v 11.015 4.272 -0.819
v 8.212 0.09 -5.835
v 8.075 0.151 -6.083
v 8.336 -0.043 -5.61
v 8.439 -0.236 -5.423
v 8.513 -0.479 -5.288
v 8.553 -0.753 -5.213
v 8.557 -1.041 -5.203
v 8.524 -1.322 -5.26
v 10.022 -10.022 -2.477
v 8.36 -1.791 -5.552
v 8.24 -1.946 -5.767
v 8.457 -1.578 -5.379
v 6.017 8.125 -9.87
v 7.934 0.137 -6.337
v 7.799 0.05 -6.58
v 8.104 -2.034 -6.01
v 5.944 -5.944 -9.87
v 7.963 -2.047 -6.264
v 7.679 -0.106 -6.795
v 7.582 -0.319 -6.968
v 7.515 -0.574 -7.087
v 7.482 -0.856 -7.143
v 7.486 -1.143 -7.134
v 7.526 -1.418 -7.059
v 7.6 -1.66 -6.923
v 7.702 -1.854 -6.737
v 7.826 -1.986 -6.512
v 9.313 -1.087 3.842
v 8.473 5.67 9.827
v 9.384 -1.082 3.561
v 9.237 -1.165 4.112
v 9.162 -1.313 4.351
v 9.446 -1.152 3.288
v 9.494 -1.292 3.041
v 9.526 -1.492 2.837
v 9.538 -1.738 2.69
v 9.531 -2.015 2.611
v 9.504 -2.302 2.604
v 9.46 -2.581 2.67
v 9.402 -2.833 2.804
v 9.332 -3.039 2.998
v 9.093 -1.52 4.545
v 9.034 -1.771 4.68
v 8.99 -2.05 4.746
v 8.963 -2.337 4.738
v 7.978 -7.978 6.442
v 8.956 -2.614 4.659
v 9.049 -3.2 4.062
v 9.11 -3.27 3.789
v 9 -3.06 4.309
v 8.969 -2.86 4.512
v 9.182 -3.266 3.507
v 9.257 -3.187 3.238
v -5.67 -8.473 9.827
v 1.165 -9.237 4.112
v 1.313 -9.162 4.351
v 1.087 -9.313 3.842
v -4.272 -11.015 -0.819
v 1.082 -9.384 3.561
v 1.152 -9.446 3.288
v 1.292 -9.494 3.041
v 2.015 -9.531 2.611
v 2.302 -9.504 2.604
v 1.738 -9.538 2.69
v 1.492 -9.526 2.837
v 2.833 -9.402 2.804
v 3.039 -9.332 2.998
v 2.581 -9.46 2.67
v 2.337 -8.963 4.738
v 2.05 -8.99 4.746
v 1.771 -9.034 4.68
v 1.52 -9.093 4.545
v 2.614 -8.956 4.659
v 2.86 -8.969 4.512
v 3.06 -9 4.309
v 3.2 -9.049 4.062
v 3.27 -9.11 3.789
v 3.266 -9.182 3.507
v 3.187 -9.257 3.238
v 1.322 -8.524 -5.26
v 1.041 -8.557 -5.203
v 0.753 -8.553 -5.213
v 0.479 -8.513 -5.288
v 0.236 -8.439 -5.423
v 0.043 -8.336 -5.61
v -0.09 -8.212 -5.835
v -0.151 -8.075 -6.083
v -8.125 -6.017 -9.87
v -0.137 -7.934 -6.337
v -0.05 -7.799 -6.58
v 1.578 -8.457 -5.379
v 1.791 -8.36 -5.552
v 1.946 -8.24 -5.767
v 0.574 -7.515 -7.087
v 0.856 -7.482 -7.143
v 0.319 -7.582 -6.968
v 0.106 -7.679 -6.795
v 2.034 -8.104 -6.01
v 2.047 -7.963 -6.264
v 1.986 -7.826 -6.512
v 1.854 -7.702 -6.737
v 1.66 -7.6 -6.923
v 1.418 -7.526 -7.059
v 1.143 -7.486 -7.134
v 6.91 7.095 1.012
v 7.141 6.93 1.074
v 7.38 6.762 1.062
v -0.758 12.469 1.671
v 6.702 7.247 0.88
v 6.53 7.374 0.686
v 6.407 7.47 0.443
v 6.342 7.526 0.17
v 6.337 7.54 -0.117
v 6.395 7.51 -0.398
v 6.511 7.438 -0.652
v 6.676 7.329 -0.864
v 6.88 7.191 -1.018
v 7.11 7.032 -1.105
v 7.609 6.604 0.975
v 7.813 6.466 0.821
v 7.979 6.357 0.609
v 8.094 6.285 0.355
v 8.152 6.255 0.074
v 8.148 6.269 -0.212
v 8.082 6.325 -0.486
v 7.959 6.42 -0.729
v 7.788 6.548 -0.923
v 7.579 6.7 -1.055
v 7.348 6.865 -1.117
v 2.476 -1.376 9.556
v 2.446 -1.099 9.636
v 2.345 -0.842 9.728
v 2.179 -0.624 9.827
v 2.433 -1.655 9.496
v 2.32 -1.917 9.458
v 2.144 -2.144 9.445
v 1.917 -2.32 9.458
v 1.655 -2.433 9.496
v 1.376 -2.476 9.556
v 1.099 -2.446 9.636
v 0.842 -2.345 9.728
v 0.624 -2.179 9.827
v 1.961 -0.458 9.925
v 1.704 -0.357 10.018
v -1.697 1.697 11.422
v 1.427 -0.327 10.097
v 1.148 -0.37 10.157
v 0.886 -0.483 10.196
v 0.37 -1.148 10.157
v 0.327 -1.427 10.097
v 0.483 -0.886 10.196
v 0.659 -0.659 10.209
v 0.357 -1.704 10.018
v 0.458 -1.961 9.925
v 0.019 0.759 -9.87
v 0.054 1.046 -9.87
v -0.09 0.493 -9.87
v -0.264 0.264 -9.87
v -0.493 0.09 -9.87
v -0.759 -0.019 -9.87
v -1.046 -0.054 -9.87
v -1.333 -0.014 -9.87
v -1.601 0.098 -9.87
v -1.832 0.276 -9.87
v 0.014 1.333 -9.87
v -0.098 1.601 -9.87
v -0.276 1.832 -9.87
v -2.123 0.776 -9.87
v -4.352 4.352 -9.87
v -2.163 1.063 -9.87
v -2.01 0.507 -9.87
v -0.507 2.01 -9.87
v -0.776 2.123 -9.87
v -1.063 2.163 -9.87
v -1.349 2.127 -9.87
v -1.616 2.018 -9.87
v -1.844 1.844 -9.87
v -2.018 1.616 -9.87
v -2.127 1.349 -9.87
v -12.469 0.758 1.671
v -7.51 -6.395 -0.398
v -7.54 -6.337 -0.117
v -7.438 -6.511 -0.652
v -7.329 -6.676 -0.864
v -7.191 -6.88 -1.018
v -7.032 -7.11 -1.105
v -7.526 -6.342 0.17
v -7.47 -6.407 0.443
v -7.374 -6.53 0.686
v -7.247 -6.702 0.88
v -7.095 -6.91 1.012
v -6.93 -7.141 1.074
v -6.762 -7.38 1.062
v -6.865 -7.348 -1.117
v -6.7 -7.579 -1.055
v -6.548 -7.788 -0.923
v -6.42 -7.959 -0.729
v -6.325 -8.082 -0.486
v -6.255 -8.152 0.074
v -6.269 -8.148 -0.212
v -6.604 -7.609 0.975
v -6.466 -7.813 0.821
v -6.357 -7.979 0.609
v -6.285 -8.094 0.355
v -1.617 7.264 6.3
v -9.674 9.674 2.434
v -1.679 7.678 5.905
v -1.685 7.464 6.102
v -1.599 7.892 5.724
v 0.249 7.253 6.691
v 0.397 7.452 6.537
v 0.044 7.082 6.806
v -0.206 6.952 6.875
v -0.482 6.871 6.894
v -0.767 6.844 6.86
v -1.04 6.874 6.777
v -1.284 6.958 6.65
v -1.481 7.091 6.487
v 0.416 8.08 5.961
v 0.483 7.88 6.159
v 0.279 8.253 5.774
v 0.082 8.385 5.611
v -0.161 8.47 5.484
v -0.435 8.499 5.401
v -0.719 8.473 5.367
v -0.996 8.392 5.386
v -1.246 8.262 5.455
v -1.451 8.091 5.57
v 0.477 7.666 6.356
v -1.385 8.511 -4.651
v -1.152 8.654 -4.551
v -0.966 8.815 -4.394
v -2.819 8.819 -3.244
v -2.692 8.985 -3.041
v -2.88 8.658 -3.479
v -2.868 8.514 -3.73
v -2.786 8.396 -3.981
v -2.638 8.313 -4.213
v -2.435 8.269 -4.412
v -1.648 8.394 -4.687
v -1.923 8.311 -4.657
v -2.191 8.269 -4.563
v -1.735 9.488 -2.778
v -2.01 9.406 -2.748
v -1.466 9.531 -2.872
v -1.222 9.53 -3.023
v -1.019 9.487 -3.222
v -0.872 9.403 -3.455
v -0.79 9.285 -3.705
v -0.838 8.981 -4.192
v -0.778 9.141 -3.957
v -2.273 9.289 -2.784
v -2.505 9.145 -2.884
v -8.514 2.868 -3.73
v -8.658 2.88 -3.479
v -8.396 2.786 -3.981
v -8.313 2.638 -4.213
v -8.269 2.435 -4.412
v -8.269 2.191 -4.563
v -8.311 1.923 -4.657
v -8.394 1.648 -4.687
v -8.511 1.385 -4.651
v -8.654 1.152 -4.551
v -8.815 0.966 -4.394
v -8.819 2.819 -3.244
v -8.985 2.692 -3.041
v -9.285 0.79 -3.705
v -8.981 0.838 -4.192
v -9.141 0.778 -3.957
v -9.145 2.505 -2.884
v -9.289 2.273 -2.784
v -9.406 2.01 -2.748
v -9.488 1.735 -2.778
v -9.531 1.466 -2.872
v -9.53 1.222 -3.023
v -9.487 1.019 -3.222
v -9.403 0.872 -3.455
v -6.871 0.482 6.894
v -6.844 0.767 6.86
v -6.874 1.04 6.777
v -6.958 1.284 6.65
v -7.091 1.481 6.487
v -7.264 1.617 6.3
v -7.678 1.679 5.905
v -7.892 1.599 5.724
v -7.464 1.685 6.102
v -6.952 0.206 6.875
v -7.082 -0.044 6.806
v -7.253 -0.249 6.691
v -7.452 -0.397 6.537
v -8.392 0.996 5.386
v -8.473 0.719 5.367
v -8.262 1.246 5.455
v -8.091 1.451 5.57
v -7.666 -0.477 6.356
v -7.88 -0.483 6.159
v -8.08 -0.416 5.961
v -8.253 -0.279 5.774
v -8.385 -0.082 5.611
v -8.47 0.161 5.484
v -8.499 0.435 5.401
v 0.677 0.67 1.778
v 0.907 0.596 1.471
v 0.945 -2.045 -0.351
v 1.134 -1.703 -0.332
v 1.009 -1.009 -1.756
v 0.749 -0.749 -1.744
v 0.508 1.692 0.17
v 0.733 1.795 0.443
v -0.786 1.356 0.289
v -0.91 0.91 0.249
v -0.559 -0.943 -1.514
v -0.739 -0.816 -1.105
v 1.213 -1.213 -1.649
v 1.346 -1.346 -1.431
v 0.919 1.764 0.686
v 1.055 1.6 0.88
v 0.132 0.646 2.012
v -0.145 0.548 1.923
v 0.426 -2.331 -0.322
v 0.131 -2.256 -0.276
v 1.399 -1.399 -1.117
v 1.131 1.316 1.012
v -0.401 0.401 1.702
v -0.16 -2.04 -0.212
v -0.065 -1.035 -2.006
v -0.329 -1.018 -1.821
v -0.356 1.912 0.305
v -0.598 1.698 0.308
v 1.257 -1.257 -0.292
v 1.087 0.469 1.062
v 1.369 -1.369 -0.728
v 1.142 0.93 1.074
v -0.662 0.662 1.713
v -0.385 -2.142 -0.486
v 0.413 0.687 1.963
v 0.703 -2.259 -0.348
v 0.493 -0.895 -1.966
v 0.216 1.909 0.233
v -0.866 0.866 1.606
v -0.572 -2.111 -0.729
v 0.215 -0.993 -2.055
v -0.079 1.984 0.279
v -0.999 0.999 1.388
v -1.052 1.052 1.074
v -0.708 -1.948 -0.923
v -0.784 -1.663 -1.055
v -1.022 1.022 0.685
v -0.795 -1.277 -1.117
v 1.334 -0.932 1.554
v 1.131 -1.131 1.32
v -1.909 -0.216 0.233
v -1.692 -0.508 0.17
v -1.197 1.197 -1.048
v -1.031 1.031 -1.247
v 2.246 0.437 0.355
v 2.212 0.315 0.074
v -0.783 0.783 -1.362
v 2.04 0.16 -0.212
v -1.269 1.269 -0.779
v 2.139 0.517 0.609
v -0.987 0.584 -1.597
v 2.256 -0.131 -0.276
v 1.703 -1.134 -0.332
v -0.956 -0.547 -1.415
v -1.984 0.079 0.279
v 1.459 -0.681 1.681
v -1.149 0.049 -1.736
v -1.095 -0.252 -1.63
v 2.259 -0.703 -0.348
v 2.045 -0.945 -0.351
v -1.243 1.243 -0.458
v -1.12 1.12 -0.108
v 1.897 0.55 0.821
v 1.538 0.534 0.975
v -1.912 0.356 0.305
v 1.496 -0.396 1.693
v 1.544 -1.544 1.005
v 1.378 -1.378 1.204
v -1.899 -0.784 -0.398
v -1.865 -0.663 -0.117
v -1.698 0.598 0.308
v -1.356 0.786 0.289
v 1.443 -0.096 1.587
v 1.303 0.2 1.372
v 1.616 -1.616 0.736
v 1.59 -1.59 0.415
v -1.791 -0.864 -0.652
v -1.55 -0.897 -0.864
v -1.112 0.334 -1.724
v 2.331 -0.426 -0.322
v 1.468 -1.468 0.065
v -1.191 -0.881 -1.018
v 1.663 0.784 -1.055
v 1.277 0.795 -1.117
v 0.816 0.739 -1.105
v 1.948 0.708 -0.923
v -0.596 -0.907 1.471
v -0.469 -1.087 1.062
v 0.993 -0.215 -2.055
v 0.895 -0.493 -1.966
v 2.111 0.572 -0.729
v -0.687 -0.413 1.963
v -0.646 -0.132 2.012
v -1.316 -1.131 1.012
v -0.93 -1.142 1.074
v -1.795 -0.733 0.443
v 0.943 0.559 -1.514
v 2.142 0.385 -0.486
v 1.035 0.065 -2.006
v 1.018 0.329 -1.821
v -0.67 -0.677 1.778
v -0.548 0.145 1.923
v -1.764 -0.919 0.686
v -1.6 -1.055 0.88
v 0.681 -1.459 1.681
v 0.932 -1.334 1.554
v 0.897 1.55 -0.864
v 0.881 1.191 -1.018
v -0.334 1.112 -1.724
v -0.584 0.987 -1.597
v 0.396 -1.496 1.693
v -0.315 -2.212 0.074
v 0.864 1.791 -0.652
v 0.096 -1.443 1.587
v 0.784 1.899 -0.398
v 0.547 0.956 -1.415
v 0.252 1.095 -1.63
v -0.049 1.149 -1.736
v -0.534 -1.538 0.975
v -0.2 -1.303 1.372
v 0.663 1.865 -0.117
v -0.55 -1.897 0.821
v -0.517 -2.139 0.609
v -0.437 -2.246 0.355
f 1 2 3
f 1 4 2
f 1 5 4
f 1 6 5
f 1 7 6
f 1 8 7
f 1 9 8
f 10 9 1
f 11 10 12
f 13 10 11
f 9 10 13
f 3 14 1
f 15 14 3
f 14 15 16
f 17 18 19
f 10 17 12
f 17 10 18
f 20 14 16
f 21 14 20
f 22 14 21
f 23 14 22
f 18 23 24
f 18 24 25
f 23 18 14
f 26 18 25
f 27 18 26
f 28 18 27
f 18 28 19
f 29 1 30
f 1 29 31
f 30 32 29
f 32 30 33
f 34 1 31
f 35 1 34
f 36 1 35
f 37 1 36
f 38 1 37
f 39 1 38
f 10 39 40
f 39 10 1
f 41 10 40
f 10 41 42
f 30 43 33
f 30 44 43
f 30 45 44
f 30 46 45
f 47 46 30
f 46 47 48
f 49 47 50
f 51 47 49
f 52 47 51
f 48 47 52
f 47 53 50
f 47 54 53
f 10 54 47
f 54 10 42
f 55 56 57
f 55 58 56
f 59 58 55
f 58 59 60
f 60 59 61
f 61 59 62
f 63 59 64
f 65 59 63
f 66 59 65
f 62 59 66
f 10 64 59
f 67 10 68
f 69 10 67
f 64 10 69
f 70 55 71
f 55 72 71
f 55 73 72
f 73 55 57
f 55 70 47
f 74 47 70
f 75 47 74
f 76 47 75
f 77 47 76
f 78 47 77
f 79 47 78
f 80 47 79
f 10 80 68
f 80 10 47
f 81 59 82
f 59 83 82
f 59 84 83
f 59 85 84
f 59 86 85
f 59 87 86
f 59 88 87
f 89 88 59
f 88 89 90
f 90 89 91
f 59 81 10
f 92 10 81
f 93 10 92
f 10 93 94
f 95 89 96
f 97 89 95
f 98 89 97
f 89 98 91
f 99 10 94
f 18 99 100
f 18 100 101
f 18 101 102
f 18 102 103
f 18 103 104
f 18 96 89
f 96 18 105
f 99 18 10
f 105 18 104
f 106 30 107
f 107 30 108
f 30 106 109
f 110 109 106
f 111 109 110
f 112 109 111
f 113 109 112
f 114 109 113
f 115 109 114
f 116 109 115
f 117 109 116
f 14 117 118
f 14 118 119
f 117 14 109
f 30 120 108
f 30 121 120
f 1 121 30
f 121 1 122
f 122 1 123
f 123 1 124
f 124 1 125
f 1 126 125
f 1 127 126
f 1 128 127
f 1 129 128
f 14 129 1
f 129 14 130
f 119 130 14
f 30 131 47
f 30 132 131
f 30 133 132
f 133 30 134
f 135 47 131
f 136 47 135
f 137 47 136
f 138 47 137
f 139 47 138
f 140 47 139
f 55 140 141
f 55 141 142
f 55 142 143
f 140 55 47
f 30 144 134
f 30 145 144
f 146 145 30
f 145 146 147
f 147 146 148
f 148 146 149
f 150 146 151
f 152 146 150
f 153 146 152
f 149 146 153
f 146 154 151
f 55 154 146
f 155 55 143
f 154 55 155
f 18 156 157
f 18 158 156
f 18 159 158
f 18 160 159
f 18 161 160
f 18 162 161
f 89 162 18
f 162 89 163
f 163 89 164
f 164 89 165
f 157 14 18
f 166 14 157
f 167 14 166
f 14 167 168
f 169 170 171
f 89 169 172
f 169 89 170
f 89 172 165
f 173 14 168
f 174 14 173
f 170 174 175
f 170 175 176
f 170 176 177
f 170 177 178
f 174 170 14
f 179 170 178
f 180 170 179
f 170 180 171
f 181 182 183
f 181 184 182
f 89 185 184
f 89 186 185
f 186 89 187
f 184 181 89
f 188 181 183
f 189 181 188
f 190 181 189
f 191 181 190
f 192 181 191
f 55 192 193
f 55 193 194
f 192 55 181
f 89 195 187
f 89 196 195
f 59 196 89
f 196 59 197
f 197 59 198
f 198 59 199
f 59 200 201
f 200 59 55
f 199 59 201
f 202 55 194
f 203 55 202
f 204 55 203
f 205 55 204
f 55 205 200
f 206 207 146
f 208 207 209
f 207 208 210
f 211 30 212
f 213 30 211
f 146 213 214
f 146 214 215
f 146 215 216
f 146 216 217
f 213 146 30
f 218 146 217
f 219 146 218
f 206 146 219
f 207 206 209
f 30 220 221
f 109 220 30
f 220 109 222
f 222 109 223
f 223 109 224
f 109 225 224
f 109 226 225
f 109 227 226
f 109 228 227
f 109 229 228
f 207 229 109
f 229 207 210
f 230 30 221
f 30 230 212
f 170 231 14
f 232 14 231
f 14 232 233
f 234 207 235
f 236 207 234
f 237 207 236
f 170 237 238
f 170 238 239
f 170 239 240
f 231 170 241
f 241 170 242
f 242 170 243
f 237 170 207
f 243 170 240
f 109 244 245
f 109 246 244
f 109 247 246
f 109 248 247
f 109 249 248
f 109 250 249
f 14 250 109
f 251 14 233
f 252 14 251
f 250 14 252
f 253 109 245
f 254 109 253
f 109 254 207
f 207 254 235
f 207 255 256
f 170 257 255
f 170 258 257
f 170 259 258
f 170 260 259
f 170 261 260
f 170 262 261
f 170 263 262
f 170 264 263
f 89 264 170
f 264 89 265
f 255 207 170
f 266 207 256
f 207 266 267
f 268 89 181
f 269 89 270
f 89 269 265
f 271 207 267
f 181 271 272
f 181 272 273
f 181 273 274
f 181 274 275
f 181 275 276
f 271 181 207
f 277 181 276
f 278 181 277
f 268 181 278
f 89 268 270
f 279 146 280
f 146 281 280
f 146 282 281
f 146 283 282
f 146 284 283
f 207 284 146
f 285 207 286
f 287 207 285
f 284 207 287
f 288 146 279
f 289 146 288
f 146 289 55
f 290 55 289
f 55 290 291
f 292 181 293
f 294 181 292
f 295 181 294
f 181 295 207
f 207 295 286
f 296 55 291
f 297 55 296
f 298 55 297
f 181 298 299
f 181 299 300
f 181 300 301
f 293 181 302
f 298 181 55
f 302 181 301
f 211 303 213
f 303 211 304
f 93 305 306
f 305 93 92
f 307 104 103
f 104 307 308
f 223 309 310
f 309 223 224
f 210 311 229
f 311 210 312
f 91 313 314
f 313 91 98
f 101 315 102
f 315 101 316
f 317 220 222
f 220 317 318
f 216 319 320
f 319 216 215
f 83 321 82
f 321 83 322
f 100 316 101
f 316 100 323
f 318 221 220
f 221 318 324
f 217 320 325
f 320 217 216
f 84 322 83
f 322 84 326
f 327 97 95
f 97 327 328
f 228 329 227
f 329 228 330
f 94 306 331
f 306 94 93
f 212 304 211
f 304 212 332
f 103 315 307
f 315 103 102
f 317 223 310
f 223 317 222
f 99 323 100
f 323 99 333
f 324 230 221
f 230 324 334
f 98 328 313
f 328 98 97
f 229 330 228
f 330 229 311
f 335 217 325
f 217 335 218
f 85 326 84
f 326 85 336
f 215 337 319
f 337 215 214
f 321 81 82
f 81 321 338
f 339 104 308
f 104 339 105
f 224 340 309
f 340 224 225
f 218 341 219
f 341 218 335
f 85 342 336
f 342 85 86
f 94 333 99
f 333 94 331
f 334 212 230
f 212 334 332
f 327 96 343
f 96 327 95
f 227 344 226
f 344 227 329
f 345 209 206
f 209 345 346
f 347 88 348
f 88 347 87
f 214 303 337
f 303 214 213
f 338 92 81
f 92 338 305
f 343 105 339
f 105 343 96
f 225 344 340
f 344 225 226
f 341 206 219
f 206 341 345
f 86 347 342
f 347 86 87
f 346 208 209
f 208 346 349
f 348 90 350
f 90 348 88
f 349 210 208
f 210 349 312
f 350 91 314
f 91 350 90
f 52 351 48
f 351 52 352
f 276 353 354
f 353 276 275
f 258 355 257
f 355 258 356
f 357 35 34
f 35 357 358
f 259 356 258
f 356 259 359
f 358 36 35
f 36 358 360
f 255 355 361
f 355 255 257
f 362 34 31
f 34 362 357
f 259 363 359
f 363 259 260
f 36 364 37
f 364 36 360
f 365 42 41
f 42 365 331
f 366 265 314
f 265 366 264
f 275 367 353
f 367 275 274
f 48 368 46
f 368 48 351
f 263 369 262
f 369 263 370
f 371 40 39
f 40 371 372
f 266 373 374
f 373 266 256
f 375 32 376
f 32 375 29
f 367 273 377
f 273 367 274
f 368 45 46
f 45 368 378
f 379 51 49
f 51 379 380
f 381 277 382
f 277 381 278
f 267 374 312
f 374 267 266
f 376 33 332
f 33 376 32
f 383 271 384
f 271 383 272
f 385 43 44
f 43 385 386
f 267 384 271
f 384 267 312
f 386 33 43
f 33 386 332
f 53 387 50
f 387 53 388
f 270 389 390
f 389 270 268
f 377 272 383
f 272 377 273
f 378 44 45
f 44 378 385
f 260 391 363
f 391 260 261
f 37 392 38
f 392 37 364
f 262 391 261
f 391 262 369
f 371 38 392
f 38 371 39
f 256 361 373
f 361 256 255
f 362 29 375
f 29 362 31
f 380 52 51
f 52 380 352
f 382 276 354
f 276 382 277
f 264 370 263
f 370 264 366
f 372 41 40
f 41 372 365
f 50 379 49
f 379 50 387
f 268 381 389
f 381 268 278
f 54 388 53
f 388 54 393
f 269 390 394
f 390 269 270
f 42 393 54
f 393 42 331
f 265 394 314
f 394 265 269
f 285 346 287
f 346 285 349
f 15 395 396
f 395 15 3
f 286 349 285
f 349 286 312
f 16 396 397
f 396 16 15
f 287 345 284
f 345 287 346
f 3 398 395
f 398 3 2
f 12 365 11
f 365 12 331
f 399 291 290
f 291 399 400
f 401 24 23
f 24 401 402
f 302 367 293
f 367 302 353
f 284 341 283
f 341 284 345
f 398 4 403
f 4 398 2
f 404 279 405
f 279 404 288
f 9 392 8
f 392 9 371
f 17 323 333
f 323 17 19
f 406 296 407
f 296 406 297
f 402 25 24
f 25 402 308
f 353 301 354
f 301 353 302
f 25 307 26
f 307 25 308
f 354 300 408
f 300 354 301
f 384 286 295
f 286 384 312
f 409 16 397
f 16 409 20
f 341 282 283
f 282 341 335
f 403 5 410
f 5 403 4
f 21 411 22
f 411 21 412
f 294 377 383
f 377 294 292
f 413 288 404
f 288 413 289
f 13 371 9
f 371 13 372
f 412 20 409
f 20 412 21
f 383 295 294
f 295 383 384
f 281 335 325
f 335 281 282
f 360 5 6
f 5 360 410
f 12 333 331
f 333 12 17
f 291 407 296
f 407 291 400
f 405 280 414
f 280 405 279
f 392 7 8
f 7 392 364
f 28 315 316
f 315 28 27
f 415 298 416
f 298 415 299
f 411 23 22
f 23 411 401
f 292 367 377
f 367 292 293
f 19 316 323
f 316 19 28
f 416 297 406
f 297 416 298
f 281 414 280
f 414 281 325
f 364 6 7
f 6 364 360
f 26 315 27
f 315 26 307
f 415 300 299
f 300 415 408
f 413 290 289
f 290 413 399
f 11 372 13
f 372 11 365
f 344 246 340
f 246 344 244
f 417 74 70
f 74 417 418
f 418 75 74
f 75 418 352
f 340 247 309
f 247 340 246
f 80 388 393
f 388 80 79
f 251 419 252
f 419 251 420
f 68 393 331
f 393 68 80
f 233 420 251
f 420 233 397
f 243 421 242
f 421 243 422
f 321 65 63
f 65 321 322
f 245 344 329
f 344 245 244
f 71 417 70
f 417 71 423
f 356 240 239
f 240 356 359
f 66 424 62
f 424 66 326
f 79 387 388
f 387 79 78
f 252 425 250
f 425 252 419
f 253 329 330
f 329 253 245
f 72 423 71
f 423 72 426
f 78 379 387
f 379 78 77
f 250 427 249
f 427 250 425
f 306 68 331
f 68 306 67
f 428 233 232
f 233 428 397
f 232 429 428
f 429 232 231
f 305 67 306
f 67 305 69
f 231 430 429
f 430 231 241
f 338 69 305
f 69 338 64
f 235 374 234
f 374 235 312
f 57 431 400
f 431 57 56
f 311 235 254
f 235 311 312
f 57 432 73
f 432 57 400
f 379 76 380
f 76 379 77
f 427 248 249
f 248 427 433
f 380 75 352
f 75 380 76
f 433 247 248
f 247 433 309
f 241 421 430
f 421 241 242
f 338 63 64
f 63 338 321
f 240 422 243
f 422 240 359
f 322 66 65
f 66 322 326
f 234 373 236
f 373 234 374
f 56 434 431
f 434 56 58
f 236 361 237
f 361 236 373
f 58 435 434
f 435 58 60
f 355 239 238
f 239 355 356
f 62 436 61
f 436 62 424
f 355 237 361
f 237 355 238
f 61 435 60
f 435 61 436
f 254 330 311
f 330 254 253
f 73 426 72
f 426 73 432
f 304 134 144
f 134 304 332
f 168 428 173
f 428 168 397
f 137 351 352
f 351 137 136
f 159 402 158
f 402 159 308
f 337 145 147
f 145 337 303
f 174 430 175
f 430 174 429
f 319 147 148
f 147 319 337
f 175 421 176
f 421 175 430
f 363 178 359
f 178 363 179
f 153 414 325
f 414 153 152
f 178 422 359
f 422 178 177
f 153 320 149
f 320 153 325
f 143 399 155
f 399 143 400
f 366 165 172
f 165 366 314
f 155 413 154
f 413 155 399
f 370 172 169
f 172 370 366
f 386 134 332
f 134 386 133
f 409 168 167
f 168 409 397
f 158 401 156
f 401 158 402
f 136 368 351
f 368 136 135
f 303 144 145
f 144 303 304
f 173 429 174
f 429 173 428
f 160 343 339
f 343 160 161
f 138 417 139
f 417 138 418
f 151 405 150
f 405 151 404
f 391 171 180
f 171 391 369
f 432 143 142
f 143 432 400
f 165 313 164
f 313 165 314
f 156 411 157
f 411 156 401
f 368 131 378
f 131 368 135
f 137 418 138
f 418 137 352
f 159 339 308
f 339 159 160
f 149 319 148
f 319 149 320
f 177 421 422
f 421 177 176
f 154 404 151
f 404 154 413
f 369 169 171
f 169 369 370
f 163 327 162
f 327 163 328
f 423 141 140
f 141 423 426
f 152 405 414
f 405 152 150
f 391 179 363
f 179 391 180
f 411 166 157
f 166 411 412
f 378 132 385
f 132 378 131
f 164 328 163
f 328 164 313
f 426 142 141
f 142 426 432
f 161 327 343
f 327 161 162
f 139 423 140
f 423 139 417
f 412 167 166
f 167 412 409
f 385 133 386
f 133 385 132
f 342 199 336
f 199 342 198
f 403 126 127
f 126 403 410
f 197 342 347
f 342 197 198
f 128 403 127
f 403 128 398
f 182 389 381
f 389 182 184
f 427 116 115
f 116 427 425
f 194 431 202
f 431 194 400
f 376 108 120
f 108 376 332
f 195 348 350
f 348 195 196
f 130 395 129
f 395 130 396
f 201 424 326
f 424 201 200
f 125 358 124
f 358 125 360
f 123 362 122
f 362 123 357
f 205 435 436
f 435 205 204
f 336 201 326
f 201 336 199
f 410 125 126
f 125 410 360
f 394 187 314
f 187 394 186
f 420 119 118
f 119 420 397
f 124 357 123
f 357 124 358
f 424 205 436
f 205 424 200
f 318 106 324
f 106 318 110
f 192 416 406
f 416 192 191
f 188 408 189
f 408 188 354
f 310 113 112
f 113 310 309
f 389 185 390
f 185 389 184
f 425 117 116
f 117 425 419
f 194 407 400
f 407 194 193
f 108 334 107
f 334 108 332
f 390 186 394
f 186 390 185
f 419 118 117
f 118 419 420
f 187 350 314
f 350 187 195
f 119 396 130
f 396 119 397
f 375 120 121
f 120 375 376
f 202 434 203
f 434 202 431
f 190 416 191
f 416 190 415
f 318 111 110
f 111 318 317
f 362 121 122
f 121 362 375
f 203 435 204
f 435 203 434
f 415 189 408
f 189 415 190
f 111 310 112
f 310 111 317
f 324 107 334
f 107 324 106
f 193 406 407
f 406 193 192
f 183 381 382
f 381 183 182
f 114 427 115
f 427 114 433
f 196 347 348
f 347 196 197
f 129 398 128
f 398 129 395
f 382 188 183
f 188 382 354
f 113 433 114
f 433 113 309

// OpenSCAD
//Шаг сетки для решётки из ромбододекаэдров (межцентровое расстояние)
MM_GRID_STEP = 20;

//диаметр отвертия (диаметр описанной окружности около многоугольника детализации)
//если диаметр = 0, то отверстий нет, 2.2 = диаметр зубочистки
MM_HOLE_DIAMETER = 2.2;

//true либо false параметр, показывающия исходный ромбододекаэдр без скоса
//для подсветки и разработки делай true, для 3Д-печати делай false
WILL_SHOW_CORE = false;

//показывать цвета
WILL_SHOW_COLOR = true;

//надо ли класть фигуру на жёлтую грань?
WILL_PUT_ON_YELLOW_FACE = true;

//длина укороченной чёрной стороны (когда 1 - ось поворта по короткой диагонали)
//ось поворота - это граница цветов 
//синее море внизу и белое небо сверху на видео от Певницкого 15 мая
CUT_RATIO = 1;
//синее море внизу и белое небо сверху, если угол положительный
CUT_DEGREE = 10;

//такой n-угольник для детализации отверстия
HOLE_DETALISATION_IS_N_POLYGON = 24;

//дальше параметры не менять, 
//сторона куба, вписанного в ромбододекаэдр, пропорциональна шагу сетки
CUBE_SIDE = MM_GRID_STEP / sqrt(2);

//тетраэдр по четырём точкам, точка номер ноль - вершина
module m_tetrahedron(p4) {
    polyhedron(points=p4, faces=[[0,1,2],[0,2,3],[0,3,1],[3,2,1]]);
}

//пирамида с четырёхугольноком в основании, точка номер ноль - вершина
module m_p5_pyramid(p5) {
    polyhedron(points=p5, faces=[[0,1,2],[0,2,3],[0,3,4],[0,4,1],[4,3,2,1]]);
}

//пирамида с треугольным или четырёхугольным основанием
module m_p4_p5(p4_or_p5) {
    if (len(p4_or_p5) == 4) {m_tetrahedron(p4_or_p5);} else {m_p5_pyramid(p4_or_p5);}
}

//интерполирование по прямой с точками р0(ноль) и р1(один) любым вещественным числом
//массивы (три координаты) тоже можно складывать и умножать на число
function f_n01(p0, p1, n01) = ((p1 - p0) * n01) + p0;

//сумма массива с любым числом точек (рекурсивно)
function f_sum_recursion(array_p, my_result, i) =
    ((i>=len(array_p)) ?
        my_result :
        f_sum_recursion(array_p, my_result + array_p[i], i+1));

//сумма векторов, array_p[0] * 0 - нужно, чтобы получить необходимое число нулей [0,0,0]
function f_sum(array_p) = f_sum_recursion(array_p, array_p[0] * 0, 0);

//центр массива точек
function f_center(array_p) = f_sum(array_p) * (1 / len(array_p));

//синтаксис для переменных (в том числе, функциональных переменных)
//my_scale - во сколько раз раздувать (масштабировать) треугольник или 4 точки
function f_three_or_four_points_extend(p3_or_p4, my_scale = 1) =
    //центр тяжести треугольника или четырёх точек
    let (c = f_center(p3_or_p4))
    //функцция раздувания трёх или четырёх точек с сохранением чентра тяжести
    let (f = function (i) f_n01(c, p3_or_p4[i], my_scale))
//раздутый треугольник или раздутые четыре точки
(len(p3_or_p4)==3) ? [f(0), f(1), f(2)] : [f(0), f(1), f(2), f(3)];

//полупространство как треугольная или четырёхугольная пирамида
//берём основание и строим пирамиду с вершиной в нуле
//раздуваем основание; если scale_pyramyd_ratio = 1, то сохраняем пропорции
//если scale_pyramyd_ratio = 2, то вытягиваем пирамиду по высоте в два раза
function f_half_space(p3_or_p4, scale_triangle = 1, scale_pyramyd_ratio = 1) = 
    //раздутое основание
    let (p3_or_p4 = f_three_or_four_points_extend(p3_or_p4, scale_triangle))
    //во сколько раз удлинять растояние от чентра основания до вершины
    let (scale_to_apex = scale_triangle * scale_pyramyd_ratio)
    //вершина пирамиды
    let (p_apex = f_n01(f_center(p3_or_p4), [0,0,0], scale_to_apex))
    //массив: вершина + треугольное основание
    let (arr_3 = [p_apex, p3_or_p4[0], p3_or_p4[1], p3_or_p4[2]])
    //массив: вершина + четырёхугольное основание
    let (arr_4 = [p_apex, p3_or_p4[0], p3_or_p4[1], p3_or_p4[2], p3_or_p4[3]])
//в зависимости от количества точек в основании пирамида труегольная или четырёхугольная
(len(p3_or_p4)==3) ? arr_3 : arr_4;

//координаты (вершин октаэдра), PX,PY,PZ-положительные, MX,MY,MZ-со знаком минус
PX = [2,0,0]; PY = [0,2,0]; PZ = [0,0,2]; MX = [-2,0,0]; MY = [0,-2,0]; MZ = [0,0,-2];
//вершины куба с одной положительной координатой
CX = [1,-1,-1]; CY = [-1,1,-1]; CZ = [-1,-1,1];
//вершины куба с двумя положительными координатами
CXY = [1,1,-1]; CYZ = [-1,1,1]; CXZ = [1,-1,1];
//две вершины куба: со всеми положительными и со всеми отрицательными координатами
CXYZ = [1,1,1]; CMMM = [-1,-1,-1];

//вершины каждой грани по часовой стрелке, если смотреть снаружи
//СУММА ПРОТИВОПОЛОЖНЫХ ГРАНЕЙ = 11
//tip - солнце (к какой вершине повёрнута верхняя часть плоскости сечения
//грани 0..3 - красные (сверху)
face_0 = [PX, CXZ, PZ, CXYZ]; tip_0 = 1;
face_1 = [PZ, CYZ, PY, CXYZ]; tip_1 = 1;
face_2 = [MX, CYZ, PZ, CZ]; tip_2 = 1;
face_3 = [PZ, CXZ, MY, CZ]; tip_3 = 1;

//грани 4..7 - жёлтые (ободок)
face_4 = [PY, CXY, PX, CXYZ]; tip_4 = 3; //четвёртая грань смотрит на нулевую и первую
face_5 = [PY, CYZ, MX, CY]; tip_5 = 3; //пятая грань отворачивается от первой и второй
face_6 = [MY, CXZ, PX, CX]; tip_7 = 3;
face_7 = [MY, CMMM, MX, CZ]; tip_6 = 3;

//грани 8..11 - зелёные (снизу)
face_8 = [MZ, CXY, PY, CY]; tip_8 = 1;
face_9 = [PX, CXY, MZ, CX]; tip_9 = 1;
face_10 = [MZ, CMMM, MY, CX]; tip_10 = 1;
face_11 = [MX, CMMM, MZ, CY]; tip_11 = 1;

//массивы кончиков стрелок, указывающих наверх (на солнце)
tip_indexes_all = [tip_0, tip_1, tip_2, tip_3, tip_4, tip_5, tip_6, tip_7, tip_8, tip_9, tip_10, tip_11];
face_all = [face_0, face_1, face_2, face_3, face_4, face_5, face_6, face_7, face_8, face_9, face_10, face_11];
//нужная точка на грани (когда точка ноль, на неё указывает срелка)
function f_face_i12_i4(i12, i4) = face_all[i12][(i4 + 4 - tip_indexes_all[i12]) % 4];
function f_face_i12(i) = [f_face_i12_i4(i,0), f_face_i12_i4(i,1), f_face_i12_i4(i,2), f_face_i12_i4(i,3)];

module m_face(i_face, scale_triangle = 1, scale_pyramyd_ratio = 1) {
    p4 = f_face_i12(i_face);
    
    p_rhombus = [p4[0], p4[1], p4[2], p4[3]];
    
    m_p4_p5(f_half_space(p_rhombus, scale_triangle, scale_pyramyd_ratio)); 
}

function f_axis(p4, my_ratio = CUT_RATIO) = [f_n01(p4[0], p4[1], my_ratio), f_n01(p4[2], p4[3], my_ratio)];

module m_my_rotation_on_axis(i_face, a_deg = CUT_DEGREE, my_ratio = CUT_RATIO) {
    ab = f_axis(f_face_i12(i_face), my_ratio);
    translate(ab[1])
        rotate(a = a_deg, v = ab[1] - ab[0])
            translate(ab[1] * (-1))
                children();
} 
 
module m_rotated_face(i_face, a_deg = CUT_DEGREE, my_ratio = CUT_RATIO) {
    m_my_rotation_on_axis(i_face, a_deg, my_ratio)
        m_face(i_face, 8, 1);
}

//B = [0,0,0]; W = [1,1,1];
ARR_COLORS = 
[[0.5,0,0],[0.5,0,0],[0.5,0,0],[0.5,0,0],
[1,1,0],[1,1,0],[1,1,0],[1,1,0],
[0,0.5,0],[0,0.5,0],[0,0.5,0],[0,0.5,0]];

module m_12_faces(will_show_not_rotated_core = WILL_SHOW_CORE, cut_ratio = CUT_RATIO, cut_degree = CUT_DEGREE) {
    intersection_for(n = [0 : 11]){
        if (WILL_SHOW_COLOR) {
            color(ARR_COLORS[n])
                hull() m_rotated_face(n, cut_degree, cut_ratio);
        }
        else
            hull() m_rotated_face(n, cut_degree, cut_ratio);
    }
    
    if (will_show_not_rotated_core)
    #rotate(0){
        m_face(0);m_face(1);m_face(2);m_face(3);
        m_face(4);m_face(5); m_face(6);m_face(7);
        m_face(8);m_face(9);m_face(10);m_face(11);
    }
}


module m_cylinder(rotate_axe=[0,0,1], rotate_deg=45, d=MM_HOLE_DIAMETER, half_h=(MM_GRID_STEP * 0.5) * 4.2) {
    rotate (a=rotate_deg, v=rotate_axe)
        cylinder(h=half_h*2, d=d, center=true, $fn=HOLE_DETALISATION_IS_N_POLYGON);
}

module m_all_cylinders() {
    if (MM_HOLE_DIAMETER > 0) {
        m_cylinder([+1,0,0], +45); m_cylinder([+1,0,0], -45); 
        m_cylinder([0,+1,0], +45); m_cylinder([0,+1,0], -45);
        m_cylinder([+1,+1,0], 90); m_cylinder([+1,-1,0], 90);
    }
}

module m_final(cut_ratio, cut_degree, xyz_n_step = [0,0,0], show_core = WILL_SHOW_CORE) {
    translate(v = xyz_n_step * MM_GRID_STEP)    
        rotate(a = 90 * (WILL_PUT_ON_YELLOW_FACE ? 1 : 0), v=[1,1,0])
            m_my_rotation_on_axis(6, -CUT_DEGREE * (WILL_PUT_ON_YELLOW_FACE ? 1 : 0))
            difference () {
                scale (CUBE_SIDE / 2) 
                    m_12_faces(show_core, cut_ratio, cut_degree);
                m_all_cylinders();
            }
}

m_final(CUT_RATIO, CUT_DEGREE);
